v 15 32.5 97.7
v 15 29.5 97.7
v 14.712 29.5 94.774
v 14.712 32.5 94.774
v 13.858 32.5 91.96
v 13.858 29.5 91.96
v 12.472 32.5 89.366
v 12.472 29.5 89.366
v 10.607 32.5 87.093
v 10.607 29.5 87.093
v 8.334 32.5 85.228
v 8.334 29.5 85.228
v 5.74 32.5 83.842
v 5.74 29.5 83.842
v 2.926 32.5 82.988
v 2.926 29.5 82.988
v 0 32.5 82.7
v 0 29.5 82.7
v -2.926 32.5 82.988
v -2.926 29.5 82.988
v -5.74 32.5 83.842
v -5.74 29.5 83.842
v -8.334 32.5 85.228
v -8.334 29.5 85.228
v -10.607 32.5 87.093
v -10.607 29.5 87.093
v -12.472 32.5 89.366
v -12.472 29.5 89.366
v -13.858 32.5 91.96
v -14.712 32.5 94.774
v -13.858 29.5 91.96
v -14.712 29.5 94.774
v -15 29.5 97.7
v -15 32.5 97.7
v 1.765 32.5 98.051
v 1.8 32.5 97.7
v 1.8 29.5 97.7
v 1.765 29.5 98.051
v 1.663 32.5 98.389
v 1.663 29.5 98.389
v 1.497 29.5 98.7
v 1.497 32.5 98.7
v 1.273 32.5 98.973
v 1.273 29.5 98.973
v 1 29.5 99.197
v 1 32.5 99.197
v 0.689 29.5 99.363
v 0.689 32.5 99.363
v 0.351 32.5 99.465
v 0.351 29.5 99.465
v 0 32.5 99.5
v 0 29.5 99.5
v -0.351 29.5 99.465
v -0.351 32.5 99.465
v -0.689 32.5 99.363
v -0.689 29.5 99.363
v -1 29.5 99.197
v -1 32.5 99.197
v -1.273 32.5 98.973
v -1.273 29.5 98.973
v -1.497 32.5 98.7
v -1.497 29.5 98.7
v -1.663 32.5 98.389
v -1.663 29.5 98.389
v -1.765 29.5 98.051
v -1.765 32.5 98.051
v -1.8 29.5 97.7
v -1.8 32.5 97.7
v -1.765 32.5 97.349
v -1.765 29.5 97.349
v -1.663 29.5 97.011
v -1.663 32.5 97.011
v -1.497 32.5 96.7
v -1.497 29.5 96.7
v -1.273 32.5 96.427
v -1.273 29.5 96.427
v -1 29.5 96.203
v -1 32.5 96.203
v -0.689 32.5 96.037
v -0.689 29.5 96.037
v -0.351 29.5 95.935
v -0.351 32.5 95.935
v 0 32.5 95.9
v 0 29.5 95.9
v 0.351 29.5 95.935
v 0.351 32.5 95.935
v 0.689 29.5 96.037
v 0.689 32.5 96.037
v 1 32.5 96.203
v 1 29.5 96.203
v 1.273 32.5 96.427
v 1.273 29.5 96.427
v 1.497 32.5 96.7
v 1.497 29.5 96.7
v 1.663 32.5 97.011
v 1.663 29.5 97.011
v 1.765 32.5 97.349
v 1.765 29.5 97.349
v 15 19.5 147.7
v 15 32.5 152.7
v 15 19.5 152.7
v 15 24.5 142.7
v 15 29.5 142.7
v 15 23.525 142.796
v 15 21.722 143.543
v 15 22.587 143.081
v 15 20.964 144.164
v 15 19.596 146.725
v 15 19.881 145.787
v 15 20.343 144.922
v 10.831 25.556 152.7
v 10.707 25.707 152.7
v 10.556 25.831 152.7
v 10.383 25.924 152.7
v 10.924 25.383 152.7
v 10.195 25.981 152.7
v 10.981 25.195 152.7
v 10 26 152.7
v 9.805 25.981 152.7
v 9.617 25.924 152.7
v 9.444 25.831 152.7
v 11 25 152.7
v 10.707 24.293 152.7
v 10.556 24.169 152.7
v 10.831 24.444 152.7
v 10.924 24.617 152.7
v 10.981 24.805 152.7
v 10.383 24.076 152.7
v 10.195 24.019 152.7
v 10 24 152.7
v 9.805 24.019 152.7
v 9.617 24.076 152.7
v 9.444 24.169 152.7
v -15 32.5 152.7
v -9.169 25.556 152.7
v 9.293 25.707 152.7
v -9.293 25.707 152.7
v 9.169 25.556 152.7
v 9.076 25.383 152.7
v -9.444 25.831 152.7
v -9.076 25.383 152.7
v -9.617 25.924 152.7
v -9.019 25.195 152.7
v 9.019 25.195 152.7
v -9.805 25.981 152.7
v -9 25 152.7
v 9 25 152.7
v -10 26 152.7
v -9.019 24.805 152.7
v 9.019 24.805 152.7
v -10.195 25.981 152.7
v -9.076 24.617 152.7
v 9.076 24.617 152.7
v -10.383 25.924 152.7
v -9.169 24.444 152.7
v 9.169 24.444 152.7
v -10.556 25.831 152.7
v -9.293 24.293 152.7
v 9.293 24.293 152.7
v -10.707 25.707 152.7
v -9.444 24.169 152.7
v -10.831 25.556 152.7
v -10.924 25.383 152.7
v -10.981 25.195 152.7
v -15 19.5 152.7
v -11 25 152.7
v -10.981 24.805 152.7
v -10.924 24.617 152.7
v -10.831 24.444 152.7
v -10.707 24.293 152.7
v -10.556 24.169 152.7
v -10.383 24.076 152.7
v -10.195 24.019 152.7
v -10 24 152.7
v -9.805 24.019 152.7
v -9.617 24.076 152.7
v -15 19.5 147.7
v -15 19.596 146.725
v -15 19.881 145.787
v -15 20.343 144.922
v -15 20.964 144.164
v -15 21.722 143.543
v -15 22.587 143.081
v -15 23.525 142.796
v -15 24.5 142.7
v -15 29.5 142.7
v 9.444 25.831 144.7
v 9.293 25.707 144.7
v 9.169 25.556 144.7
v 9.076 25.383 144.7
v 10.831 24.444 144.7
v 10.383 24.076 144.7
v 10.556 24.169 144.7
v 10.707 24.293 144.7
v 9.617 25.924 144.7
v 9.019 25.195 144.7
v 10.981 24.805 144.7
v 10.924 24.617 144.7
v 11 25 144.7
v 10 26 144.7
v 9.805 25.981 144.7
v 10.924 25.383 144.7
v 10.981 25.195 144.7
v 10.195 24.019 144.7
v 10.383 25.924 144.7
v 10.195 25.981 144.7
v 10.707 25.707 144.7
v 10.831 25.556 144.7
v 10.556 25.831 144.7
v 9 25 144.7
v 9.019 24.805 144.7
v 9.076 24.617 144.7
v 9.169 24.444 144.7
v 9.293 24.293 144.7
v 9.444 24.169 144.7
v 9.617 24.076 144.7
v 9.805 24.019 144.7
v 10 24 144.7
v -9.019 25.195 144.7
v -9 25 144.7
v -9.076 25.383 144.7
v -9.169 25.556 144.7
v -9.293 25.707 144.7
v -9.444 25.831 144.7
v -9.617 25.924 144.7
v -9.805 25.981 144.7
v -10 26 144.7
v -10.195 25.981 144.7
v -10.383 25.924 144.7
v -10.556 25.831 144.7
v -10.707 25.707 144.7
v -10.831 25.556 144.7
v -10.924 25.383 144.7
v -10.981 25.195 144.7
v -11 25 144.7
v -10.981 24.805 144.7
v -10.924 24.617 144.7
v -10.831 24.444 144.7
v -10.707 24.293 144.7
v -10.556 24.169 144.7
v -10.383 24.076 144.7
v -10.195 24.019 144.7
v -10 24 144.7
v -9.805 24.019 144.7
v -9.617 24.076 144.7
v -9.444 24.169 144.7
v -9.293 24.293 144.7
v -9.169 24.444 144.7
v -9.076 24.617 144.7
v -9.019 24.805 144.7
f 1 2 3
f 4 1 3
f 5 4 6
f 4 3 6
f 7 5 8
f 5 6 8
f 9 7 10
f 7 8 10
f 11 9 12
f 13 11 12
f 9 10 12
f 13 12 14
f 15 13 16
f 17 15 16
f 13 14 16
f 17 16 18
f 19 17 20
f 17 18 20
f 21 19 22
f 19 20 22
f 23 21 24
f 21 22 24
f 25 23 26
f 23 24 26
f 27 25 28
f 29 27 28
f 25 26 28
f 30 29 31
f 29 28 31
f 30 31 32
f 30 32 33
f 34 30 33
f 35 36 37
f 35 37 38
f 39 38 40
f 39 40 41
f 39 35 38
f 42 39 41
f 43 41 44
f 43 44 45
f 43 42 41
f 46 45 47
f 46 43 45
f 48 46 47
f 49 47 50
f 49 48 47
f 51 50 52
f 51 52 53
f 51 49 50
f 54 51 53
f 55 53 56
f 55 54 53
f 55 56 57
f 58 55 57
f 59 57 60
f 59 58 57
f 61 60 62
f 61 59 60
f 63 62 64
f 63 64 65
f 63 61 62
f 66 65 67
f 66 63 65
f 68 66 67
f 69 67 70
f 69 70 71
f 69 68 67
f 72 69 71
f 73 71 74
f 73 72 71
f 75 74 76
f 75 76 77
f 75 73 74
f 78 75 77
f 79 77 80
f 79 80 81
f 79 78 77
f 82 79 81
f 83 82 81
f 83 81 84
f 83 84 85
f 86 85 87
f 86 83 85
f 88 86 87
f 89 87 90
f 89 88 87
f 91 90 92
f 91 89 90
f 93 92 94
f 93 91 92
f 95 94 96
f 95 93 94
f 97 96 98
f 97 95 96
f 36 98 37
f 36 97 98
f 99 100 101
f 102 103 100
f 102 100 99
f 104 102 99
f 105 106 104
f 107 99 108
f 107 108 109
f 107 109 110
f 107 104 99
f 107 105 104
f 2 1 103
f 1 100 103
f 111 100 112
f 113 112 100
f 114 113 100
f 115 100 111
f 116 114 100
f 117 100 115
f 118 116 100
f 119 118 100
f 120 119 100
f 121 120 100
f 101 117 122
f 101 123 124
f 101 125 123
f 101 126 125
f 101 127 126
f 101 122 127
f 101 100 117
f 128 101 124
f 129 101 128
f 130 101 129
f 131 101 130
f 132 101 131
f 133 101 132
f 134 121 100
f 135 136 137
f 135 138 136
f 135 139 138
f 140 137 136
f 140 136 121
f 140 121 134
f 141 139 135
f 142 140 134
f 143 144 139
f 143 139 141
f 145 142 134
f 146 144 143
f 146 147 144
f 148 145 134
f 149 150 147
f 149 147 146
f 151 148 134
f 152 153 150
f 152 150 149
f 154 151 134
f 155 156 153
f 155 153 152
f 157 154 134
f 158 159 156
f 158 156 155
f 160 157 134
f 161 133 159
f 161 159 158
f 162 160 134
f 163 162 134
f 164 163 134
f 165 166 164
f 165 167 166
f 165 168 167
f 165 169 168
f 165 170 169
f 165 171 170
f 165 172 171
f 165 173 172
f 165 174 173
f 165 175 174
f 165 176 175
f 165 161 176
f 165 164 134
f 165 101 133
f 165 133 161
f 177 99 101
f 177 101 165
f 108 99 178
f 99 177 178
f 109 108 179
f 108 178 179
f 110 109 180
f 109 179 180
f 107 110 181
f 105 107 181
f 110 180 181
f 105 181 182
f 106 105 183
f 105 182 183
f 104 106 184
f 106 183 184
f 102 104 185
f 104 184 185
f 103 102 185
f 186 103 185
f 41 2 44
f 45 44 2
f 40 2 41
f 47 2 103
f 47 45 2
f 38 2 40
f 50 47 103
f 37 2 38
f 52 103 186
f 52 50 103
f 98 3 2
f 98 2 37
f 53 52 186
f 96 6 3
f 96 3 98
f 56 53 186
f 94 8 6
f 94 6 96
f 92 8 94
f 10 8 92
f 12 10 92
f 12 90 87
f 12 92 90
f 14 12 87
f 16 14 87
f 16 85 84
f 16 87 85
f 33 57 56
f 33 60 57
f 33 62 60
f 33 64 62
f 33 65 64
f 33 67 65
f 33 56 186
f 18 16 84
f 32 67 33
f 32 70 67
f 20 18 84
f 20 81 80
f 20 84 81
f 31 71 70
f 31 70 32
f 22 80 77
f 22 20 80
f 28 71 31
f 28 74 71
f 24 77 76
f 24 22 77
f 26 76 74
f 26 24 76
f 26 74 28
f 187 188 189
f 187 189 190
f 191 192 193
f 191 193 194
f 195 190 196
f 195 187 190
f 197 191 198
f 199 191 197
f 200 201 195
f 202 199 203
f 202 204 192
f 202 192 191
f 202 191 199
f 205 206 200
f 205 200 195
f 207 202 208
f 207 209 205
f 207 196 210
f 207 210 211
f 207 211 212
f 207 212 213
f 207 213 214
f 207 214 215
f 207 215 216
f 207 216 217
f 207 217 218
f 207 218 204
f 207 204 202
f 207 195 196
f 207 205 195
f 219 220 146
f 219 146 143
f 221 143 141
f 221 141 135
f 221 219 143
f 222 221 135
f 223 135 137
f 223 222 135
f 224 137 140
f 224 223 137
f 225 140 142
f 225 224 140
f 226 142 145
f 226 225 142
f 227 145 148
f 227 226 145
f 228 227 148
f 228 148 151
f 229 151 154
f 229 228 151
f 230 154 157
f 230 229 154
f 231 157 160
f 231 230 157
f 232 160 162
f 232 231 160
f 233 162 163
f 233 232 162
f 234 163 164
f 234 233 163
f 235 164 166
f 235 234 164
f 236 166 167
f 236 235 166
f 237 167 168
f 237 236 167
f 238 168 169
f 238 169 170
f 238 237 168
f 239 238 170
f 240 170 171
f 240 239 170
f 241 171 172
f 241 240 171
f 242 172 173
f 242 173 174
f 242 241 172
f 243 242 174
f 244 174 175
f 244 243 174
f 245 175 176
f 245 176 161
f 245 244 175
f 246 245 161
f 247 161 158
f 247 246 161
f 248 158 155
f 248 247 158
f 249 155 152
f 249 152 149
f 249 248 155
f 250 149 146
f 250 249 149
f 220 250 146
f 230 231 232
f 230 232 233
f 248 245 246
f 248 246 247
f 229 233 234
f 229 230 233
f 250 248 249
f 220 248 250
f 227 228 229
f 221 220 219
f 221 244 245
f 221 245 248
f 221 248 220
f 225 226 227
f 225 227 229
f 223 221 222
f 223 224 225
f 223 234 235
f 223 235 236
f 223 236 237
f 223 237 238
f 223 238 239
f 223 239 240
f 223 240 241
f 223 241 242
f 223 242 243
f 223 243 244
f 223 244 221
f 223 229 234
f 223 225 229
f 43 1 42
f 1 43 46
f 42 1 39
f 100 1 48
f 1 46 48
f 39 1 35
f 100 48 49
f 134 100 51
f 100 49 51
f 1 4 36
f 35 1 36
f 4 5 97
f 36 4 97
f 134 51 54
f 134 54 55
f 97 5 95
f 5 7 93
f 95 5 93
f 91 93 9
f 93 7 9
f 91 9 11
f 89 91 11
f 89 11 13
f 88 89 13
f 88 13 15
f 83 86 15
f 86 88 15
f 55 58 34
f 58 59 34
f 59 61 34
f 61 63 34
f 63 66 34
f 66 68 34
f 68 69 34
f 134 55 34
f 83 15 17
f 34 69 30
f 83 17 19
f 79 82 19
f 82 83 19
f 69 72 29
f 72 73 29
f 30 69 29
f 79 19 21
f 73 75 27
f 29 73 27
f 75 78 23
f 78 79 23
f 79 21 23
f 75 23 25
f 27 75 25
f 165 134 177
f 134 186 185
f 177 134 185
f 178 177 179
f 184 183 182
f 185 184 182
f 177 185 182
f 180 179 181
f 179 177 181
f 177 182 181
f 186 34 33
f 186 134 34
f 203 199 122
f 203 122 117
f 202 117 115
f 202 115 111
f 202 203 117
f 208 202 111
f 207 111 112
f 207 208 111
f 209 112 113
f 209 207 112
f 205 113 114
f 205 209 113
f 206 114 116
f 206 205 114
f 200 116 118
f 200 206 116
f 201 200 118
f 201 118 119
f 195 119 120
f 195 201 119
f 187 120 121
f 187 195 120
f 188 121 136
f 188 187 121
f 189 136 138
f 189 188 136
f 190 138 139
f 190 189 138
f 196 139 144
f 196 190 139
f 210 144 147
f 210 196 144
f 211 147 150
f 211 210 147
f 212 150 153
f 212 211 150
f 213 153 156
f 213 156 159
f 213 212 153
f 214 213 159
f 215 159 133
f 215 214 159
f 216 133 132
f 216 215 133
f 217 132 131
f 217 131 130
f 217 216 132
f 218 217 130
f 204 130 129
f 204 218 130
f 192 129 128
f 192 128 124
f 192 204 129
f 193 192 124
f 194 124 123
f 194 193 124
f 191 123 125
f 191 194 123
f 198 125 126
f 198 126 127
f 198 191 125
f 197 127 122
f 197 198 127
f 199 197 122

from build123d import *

# Parameters (mm, degrees)
CYLINDER046_R             = 1
CYLINDER046_DEPTH         = 8
CYLINDER045_R             = 1
CYLINDER045_DEPTH         = 8
CYLINDER044_R             = 1.8
CYLINDER044_DEPTH         = 3
BOX006_W                  = 30
BOX006_H                  = 3
BOX006_DEPTH              = 55
BOX007_W                  = 30
BOX007_H                  = 10
BOX007_DEPTH              = 10
FILLET005_R               = 5
CYLINDER043_R             = 15
CYLINDER043_DEPTH         = 3
FUSION016_PLACEMENT_ANGLE = 180


with BuildPart() as arm_support_payload_plate_screw002:
    # Cylinder046 → Cylinder046 (new body)
    with BuildSketch(Plane(origin=(-10, 25, 144.7), x_dir=(1, 0, 0), z_dir=(0, 0, 1))):
        Circle(CYLINDER046_R)
    extrude(amount=CYLINDER046_DEPTH)


with BuildPart() as arm_support_payload_plate_screw001:
    # Cylinder045 → Cylinder045 (new body)
    with BuildSketch(Plane(origin=(10, 25, 144.7), x_dir=(1, 0, 0), z_dir=(0, 0, 1))):
        Circle(CYLINDER045_R)
    extrude(amount=CYLINDER045_DEPTH)


with BuildPart() as arm_support_screw_and_axis_holes:
    # Cylinder044 → Cylinder044 (new body)
    with BuildSketch(Plane(origin=(0, 32.5, 97.7), x_dir=(1, 0, 0), z_dir=(0, -1, 0))):
        Circle(CYLINDER044_R)
    extrude(amount=CYLINDER044_DEPTH)

    # Compound004: union arm-support-payload-plate-screw002, arm-support-payload-plate-screw001
    add(arm_support_payload_plate_screw002.part)
    add(arm_support_payload_plate_screw001.part)


with BuildPart() as arm_support:
    # Box006 → Box006 (new body)
    with BuildSketch(Plane(origin=(-15, -40.5, 97.7), x_dir=(1, 0, 0), z_dir=(0, 0, 1))):
        with Locations((15, 1.5)):
            Rectangle(BOX006_W, BOX006_H)
    extrude(amount=BOX006_DEPTH)


with BuildPart() as arm_screw_block_with_fillet001:
    # Box007 → Box007 (new body)
    with BuildSketch(Plane(origin=(-15, -37.5, 142.7), x_dir=(1, 0, 0), z_dir=(0, 0, 1))):
        with Locations((15, 5)):
            Rectangle(BOX007_W, BOX007_H)
    extrude(amount=BOX007_DEPTH)

    # Fillet005
    fillet005_edges = [arm_screw_block_with_fillet001.edges().sort_by_distance(p)[0] for p in [
        (0, -27.5, 142.7),
    ]]
    fillet(fillet005_edges, radius=FILLET005_R)


with BuildPart() as support_arm:
    # Cylinder043 → Cylinder043 (new body)
    with BuildSketch(Plane(origin=(0, -37.5, 97.7), x_dir=(1, 0, 0), z_dir=(0, -1, 0))):
        Circle(CYLINDER043_R)
    extrude(amount=CYLINDER043_DEPTH)

    # Fusion016: union arm-support, arm-screw-block-with-fillet001
    add(arm_support.part)
    add(arm_screw_block_with_fillet001.part)


with BuildPart() as support_arm_1:
    # Fusion016 placement: moved
    add(support_arm.part.moved(Location((0, -8, 0))).rotate(Axis((0, -8, 0), (0, 0, 1)), FUSION016_PLACEMENT_ANGLE))

    # Cut029: cut arm-support-screw-and-axis-holes
    add(arm_support_screw_and_axis_holes.part, mode=Mode.SUBTRACT)


solid = support_arm_1.part
